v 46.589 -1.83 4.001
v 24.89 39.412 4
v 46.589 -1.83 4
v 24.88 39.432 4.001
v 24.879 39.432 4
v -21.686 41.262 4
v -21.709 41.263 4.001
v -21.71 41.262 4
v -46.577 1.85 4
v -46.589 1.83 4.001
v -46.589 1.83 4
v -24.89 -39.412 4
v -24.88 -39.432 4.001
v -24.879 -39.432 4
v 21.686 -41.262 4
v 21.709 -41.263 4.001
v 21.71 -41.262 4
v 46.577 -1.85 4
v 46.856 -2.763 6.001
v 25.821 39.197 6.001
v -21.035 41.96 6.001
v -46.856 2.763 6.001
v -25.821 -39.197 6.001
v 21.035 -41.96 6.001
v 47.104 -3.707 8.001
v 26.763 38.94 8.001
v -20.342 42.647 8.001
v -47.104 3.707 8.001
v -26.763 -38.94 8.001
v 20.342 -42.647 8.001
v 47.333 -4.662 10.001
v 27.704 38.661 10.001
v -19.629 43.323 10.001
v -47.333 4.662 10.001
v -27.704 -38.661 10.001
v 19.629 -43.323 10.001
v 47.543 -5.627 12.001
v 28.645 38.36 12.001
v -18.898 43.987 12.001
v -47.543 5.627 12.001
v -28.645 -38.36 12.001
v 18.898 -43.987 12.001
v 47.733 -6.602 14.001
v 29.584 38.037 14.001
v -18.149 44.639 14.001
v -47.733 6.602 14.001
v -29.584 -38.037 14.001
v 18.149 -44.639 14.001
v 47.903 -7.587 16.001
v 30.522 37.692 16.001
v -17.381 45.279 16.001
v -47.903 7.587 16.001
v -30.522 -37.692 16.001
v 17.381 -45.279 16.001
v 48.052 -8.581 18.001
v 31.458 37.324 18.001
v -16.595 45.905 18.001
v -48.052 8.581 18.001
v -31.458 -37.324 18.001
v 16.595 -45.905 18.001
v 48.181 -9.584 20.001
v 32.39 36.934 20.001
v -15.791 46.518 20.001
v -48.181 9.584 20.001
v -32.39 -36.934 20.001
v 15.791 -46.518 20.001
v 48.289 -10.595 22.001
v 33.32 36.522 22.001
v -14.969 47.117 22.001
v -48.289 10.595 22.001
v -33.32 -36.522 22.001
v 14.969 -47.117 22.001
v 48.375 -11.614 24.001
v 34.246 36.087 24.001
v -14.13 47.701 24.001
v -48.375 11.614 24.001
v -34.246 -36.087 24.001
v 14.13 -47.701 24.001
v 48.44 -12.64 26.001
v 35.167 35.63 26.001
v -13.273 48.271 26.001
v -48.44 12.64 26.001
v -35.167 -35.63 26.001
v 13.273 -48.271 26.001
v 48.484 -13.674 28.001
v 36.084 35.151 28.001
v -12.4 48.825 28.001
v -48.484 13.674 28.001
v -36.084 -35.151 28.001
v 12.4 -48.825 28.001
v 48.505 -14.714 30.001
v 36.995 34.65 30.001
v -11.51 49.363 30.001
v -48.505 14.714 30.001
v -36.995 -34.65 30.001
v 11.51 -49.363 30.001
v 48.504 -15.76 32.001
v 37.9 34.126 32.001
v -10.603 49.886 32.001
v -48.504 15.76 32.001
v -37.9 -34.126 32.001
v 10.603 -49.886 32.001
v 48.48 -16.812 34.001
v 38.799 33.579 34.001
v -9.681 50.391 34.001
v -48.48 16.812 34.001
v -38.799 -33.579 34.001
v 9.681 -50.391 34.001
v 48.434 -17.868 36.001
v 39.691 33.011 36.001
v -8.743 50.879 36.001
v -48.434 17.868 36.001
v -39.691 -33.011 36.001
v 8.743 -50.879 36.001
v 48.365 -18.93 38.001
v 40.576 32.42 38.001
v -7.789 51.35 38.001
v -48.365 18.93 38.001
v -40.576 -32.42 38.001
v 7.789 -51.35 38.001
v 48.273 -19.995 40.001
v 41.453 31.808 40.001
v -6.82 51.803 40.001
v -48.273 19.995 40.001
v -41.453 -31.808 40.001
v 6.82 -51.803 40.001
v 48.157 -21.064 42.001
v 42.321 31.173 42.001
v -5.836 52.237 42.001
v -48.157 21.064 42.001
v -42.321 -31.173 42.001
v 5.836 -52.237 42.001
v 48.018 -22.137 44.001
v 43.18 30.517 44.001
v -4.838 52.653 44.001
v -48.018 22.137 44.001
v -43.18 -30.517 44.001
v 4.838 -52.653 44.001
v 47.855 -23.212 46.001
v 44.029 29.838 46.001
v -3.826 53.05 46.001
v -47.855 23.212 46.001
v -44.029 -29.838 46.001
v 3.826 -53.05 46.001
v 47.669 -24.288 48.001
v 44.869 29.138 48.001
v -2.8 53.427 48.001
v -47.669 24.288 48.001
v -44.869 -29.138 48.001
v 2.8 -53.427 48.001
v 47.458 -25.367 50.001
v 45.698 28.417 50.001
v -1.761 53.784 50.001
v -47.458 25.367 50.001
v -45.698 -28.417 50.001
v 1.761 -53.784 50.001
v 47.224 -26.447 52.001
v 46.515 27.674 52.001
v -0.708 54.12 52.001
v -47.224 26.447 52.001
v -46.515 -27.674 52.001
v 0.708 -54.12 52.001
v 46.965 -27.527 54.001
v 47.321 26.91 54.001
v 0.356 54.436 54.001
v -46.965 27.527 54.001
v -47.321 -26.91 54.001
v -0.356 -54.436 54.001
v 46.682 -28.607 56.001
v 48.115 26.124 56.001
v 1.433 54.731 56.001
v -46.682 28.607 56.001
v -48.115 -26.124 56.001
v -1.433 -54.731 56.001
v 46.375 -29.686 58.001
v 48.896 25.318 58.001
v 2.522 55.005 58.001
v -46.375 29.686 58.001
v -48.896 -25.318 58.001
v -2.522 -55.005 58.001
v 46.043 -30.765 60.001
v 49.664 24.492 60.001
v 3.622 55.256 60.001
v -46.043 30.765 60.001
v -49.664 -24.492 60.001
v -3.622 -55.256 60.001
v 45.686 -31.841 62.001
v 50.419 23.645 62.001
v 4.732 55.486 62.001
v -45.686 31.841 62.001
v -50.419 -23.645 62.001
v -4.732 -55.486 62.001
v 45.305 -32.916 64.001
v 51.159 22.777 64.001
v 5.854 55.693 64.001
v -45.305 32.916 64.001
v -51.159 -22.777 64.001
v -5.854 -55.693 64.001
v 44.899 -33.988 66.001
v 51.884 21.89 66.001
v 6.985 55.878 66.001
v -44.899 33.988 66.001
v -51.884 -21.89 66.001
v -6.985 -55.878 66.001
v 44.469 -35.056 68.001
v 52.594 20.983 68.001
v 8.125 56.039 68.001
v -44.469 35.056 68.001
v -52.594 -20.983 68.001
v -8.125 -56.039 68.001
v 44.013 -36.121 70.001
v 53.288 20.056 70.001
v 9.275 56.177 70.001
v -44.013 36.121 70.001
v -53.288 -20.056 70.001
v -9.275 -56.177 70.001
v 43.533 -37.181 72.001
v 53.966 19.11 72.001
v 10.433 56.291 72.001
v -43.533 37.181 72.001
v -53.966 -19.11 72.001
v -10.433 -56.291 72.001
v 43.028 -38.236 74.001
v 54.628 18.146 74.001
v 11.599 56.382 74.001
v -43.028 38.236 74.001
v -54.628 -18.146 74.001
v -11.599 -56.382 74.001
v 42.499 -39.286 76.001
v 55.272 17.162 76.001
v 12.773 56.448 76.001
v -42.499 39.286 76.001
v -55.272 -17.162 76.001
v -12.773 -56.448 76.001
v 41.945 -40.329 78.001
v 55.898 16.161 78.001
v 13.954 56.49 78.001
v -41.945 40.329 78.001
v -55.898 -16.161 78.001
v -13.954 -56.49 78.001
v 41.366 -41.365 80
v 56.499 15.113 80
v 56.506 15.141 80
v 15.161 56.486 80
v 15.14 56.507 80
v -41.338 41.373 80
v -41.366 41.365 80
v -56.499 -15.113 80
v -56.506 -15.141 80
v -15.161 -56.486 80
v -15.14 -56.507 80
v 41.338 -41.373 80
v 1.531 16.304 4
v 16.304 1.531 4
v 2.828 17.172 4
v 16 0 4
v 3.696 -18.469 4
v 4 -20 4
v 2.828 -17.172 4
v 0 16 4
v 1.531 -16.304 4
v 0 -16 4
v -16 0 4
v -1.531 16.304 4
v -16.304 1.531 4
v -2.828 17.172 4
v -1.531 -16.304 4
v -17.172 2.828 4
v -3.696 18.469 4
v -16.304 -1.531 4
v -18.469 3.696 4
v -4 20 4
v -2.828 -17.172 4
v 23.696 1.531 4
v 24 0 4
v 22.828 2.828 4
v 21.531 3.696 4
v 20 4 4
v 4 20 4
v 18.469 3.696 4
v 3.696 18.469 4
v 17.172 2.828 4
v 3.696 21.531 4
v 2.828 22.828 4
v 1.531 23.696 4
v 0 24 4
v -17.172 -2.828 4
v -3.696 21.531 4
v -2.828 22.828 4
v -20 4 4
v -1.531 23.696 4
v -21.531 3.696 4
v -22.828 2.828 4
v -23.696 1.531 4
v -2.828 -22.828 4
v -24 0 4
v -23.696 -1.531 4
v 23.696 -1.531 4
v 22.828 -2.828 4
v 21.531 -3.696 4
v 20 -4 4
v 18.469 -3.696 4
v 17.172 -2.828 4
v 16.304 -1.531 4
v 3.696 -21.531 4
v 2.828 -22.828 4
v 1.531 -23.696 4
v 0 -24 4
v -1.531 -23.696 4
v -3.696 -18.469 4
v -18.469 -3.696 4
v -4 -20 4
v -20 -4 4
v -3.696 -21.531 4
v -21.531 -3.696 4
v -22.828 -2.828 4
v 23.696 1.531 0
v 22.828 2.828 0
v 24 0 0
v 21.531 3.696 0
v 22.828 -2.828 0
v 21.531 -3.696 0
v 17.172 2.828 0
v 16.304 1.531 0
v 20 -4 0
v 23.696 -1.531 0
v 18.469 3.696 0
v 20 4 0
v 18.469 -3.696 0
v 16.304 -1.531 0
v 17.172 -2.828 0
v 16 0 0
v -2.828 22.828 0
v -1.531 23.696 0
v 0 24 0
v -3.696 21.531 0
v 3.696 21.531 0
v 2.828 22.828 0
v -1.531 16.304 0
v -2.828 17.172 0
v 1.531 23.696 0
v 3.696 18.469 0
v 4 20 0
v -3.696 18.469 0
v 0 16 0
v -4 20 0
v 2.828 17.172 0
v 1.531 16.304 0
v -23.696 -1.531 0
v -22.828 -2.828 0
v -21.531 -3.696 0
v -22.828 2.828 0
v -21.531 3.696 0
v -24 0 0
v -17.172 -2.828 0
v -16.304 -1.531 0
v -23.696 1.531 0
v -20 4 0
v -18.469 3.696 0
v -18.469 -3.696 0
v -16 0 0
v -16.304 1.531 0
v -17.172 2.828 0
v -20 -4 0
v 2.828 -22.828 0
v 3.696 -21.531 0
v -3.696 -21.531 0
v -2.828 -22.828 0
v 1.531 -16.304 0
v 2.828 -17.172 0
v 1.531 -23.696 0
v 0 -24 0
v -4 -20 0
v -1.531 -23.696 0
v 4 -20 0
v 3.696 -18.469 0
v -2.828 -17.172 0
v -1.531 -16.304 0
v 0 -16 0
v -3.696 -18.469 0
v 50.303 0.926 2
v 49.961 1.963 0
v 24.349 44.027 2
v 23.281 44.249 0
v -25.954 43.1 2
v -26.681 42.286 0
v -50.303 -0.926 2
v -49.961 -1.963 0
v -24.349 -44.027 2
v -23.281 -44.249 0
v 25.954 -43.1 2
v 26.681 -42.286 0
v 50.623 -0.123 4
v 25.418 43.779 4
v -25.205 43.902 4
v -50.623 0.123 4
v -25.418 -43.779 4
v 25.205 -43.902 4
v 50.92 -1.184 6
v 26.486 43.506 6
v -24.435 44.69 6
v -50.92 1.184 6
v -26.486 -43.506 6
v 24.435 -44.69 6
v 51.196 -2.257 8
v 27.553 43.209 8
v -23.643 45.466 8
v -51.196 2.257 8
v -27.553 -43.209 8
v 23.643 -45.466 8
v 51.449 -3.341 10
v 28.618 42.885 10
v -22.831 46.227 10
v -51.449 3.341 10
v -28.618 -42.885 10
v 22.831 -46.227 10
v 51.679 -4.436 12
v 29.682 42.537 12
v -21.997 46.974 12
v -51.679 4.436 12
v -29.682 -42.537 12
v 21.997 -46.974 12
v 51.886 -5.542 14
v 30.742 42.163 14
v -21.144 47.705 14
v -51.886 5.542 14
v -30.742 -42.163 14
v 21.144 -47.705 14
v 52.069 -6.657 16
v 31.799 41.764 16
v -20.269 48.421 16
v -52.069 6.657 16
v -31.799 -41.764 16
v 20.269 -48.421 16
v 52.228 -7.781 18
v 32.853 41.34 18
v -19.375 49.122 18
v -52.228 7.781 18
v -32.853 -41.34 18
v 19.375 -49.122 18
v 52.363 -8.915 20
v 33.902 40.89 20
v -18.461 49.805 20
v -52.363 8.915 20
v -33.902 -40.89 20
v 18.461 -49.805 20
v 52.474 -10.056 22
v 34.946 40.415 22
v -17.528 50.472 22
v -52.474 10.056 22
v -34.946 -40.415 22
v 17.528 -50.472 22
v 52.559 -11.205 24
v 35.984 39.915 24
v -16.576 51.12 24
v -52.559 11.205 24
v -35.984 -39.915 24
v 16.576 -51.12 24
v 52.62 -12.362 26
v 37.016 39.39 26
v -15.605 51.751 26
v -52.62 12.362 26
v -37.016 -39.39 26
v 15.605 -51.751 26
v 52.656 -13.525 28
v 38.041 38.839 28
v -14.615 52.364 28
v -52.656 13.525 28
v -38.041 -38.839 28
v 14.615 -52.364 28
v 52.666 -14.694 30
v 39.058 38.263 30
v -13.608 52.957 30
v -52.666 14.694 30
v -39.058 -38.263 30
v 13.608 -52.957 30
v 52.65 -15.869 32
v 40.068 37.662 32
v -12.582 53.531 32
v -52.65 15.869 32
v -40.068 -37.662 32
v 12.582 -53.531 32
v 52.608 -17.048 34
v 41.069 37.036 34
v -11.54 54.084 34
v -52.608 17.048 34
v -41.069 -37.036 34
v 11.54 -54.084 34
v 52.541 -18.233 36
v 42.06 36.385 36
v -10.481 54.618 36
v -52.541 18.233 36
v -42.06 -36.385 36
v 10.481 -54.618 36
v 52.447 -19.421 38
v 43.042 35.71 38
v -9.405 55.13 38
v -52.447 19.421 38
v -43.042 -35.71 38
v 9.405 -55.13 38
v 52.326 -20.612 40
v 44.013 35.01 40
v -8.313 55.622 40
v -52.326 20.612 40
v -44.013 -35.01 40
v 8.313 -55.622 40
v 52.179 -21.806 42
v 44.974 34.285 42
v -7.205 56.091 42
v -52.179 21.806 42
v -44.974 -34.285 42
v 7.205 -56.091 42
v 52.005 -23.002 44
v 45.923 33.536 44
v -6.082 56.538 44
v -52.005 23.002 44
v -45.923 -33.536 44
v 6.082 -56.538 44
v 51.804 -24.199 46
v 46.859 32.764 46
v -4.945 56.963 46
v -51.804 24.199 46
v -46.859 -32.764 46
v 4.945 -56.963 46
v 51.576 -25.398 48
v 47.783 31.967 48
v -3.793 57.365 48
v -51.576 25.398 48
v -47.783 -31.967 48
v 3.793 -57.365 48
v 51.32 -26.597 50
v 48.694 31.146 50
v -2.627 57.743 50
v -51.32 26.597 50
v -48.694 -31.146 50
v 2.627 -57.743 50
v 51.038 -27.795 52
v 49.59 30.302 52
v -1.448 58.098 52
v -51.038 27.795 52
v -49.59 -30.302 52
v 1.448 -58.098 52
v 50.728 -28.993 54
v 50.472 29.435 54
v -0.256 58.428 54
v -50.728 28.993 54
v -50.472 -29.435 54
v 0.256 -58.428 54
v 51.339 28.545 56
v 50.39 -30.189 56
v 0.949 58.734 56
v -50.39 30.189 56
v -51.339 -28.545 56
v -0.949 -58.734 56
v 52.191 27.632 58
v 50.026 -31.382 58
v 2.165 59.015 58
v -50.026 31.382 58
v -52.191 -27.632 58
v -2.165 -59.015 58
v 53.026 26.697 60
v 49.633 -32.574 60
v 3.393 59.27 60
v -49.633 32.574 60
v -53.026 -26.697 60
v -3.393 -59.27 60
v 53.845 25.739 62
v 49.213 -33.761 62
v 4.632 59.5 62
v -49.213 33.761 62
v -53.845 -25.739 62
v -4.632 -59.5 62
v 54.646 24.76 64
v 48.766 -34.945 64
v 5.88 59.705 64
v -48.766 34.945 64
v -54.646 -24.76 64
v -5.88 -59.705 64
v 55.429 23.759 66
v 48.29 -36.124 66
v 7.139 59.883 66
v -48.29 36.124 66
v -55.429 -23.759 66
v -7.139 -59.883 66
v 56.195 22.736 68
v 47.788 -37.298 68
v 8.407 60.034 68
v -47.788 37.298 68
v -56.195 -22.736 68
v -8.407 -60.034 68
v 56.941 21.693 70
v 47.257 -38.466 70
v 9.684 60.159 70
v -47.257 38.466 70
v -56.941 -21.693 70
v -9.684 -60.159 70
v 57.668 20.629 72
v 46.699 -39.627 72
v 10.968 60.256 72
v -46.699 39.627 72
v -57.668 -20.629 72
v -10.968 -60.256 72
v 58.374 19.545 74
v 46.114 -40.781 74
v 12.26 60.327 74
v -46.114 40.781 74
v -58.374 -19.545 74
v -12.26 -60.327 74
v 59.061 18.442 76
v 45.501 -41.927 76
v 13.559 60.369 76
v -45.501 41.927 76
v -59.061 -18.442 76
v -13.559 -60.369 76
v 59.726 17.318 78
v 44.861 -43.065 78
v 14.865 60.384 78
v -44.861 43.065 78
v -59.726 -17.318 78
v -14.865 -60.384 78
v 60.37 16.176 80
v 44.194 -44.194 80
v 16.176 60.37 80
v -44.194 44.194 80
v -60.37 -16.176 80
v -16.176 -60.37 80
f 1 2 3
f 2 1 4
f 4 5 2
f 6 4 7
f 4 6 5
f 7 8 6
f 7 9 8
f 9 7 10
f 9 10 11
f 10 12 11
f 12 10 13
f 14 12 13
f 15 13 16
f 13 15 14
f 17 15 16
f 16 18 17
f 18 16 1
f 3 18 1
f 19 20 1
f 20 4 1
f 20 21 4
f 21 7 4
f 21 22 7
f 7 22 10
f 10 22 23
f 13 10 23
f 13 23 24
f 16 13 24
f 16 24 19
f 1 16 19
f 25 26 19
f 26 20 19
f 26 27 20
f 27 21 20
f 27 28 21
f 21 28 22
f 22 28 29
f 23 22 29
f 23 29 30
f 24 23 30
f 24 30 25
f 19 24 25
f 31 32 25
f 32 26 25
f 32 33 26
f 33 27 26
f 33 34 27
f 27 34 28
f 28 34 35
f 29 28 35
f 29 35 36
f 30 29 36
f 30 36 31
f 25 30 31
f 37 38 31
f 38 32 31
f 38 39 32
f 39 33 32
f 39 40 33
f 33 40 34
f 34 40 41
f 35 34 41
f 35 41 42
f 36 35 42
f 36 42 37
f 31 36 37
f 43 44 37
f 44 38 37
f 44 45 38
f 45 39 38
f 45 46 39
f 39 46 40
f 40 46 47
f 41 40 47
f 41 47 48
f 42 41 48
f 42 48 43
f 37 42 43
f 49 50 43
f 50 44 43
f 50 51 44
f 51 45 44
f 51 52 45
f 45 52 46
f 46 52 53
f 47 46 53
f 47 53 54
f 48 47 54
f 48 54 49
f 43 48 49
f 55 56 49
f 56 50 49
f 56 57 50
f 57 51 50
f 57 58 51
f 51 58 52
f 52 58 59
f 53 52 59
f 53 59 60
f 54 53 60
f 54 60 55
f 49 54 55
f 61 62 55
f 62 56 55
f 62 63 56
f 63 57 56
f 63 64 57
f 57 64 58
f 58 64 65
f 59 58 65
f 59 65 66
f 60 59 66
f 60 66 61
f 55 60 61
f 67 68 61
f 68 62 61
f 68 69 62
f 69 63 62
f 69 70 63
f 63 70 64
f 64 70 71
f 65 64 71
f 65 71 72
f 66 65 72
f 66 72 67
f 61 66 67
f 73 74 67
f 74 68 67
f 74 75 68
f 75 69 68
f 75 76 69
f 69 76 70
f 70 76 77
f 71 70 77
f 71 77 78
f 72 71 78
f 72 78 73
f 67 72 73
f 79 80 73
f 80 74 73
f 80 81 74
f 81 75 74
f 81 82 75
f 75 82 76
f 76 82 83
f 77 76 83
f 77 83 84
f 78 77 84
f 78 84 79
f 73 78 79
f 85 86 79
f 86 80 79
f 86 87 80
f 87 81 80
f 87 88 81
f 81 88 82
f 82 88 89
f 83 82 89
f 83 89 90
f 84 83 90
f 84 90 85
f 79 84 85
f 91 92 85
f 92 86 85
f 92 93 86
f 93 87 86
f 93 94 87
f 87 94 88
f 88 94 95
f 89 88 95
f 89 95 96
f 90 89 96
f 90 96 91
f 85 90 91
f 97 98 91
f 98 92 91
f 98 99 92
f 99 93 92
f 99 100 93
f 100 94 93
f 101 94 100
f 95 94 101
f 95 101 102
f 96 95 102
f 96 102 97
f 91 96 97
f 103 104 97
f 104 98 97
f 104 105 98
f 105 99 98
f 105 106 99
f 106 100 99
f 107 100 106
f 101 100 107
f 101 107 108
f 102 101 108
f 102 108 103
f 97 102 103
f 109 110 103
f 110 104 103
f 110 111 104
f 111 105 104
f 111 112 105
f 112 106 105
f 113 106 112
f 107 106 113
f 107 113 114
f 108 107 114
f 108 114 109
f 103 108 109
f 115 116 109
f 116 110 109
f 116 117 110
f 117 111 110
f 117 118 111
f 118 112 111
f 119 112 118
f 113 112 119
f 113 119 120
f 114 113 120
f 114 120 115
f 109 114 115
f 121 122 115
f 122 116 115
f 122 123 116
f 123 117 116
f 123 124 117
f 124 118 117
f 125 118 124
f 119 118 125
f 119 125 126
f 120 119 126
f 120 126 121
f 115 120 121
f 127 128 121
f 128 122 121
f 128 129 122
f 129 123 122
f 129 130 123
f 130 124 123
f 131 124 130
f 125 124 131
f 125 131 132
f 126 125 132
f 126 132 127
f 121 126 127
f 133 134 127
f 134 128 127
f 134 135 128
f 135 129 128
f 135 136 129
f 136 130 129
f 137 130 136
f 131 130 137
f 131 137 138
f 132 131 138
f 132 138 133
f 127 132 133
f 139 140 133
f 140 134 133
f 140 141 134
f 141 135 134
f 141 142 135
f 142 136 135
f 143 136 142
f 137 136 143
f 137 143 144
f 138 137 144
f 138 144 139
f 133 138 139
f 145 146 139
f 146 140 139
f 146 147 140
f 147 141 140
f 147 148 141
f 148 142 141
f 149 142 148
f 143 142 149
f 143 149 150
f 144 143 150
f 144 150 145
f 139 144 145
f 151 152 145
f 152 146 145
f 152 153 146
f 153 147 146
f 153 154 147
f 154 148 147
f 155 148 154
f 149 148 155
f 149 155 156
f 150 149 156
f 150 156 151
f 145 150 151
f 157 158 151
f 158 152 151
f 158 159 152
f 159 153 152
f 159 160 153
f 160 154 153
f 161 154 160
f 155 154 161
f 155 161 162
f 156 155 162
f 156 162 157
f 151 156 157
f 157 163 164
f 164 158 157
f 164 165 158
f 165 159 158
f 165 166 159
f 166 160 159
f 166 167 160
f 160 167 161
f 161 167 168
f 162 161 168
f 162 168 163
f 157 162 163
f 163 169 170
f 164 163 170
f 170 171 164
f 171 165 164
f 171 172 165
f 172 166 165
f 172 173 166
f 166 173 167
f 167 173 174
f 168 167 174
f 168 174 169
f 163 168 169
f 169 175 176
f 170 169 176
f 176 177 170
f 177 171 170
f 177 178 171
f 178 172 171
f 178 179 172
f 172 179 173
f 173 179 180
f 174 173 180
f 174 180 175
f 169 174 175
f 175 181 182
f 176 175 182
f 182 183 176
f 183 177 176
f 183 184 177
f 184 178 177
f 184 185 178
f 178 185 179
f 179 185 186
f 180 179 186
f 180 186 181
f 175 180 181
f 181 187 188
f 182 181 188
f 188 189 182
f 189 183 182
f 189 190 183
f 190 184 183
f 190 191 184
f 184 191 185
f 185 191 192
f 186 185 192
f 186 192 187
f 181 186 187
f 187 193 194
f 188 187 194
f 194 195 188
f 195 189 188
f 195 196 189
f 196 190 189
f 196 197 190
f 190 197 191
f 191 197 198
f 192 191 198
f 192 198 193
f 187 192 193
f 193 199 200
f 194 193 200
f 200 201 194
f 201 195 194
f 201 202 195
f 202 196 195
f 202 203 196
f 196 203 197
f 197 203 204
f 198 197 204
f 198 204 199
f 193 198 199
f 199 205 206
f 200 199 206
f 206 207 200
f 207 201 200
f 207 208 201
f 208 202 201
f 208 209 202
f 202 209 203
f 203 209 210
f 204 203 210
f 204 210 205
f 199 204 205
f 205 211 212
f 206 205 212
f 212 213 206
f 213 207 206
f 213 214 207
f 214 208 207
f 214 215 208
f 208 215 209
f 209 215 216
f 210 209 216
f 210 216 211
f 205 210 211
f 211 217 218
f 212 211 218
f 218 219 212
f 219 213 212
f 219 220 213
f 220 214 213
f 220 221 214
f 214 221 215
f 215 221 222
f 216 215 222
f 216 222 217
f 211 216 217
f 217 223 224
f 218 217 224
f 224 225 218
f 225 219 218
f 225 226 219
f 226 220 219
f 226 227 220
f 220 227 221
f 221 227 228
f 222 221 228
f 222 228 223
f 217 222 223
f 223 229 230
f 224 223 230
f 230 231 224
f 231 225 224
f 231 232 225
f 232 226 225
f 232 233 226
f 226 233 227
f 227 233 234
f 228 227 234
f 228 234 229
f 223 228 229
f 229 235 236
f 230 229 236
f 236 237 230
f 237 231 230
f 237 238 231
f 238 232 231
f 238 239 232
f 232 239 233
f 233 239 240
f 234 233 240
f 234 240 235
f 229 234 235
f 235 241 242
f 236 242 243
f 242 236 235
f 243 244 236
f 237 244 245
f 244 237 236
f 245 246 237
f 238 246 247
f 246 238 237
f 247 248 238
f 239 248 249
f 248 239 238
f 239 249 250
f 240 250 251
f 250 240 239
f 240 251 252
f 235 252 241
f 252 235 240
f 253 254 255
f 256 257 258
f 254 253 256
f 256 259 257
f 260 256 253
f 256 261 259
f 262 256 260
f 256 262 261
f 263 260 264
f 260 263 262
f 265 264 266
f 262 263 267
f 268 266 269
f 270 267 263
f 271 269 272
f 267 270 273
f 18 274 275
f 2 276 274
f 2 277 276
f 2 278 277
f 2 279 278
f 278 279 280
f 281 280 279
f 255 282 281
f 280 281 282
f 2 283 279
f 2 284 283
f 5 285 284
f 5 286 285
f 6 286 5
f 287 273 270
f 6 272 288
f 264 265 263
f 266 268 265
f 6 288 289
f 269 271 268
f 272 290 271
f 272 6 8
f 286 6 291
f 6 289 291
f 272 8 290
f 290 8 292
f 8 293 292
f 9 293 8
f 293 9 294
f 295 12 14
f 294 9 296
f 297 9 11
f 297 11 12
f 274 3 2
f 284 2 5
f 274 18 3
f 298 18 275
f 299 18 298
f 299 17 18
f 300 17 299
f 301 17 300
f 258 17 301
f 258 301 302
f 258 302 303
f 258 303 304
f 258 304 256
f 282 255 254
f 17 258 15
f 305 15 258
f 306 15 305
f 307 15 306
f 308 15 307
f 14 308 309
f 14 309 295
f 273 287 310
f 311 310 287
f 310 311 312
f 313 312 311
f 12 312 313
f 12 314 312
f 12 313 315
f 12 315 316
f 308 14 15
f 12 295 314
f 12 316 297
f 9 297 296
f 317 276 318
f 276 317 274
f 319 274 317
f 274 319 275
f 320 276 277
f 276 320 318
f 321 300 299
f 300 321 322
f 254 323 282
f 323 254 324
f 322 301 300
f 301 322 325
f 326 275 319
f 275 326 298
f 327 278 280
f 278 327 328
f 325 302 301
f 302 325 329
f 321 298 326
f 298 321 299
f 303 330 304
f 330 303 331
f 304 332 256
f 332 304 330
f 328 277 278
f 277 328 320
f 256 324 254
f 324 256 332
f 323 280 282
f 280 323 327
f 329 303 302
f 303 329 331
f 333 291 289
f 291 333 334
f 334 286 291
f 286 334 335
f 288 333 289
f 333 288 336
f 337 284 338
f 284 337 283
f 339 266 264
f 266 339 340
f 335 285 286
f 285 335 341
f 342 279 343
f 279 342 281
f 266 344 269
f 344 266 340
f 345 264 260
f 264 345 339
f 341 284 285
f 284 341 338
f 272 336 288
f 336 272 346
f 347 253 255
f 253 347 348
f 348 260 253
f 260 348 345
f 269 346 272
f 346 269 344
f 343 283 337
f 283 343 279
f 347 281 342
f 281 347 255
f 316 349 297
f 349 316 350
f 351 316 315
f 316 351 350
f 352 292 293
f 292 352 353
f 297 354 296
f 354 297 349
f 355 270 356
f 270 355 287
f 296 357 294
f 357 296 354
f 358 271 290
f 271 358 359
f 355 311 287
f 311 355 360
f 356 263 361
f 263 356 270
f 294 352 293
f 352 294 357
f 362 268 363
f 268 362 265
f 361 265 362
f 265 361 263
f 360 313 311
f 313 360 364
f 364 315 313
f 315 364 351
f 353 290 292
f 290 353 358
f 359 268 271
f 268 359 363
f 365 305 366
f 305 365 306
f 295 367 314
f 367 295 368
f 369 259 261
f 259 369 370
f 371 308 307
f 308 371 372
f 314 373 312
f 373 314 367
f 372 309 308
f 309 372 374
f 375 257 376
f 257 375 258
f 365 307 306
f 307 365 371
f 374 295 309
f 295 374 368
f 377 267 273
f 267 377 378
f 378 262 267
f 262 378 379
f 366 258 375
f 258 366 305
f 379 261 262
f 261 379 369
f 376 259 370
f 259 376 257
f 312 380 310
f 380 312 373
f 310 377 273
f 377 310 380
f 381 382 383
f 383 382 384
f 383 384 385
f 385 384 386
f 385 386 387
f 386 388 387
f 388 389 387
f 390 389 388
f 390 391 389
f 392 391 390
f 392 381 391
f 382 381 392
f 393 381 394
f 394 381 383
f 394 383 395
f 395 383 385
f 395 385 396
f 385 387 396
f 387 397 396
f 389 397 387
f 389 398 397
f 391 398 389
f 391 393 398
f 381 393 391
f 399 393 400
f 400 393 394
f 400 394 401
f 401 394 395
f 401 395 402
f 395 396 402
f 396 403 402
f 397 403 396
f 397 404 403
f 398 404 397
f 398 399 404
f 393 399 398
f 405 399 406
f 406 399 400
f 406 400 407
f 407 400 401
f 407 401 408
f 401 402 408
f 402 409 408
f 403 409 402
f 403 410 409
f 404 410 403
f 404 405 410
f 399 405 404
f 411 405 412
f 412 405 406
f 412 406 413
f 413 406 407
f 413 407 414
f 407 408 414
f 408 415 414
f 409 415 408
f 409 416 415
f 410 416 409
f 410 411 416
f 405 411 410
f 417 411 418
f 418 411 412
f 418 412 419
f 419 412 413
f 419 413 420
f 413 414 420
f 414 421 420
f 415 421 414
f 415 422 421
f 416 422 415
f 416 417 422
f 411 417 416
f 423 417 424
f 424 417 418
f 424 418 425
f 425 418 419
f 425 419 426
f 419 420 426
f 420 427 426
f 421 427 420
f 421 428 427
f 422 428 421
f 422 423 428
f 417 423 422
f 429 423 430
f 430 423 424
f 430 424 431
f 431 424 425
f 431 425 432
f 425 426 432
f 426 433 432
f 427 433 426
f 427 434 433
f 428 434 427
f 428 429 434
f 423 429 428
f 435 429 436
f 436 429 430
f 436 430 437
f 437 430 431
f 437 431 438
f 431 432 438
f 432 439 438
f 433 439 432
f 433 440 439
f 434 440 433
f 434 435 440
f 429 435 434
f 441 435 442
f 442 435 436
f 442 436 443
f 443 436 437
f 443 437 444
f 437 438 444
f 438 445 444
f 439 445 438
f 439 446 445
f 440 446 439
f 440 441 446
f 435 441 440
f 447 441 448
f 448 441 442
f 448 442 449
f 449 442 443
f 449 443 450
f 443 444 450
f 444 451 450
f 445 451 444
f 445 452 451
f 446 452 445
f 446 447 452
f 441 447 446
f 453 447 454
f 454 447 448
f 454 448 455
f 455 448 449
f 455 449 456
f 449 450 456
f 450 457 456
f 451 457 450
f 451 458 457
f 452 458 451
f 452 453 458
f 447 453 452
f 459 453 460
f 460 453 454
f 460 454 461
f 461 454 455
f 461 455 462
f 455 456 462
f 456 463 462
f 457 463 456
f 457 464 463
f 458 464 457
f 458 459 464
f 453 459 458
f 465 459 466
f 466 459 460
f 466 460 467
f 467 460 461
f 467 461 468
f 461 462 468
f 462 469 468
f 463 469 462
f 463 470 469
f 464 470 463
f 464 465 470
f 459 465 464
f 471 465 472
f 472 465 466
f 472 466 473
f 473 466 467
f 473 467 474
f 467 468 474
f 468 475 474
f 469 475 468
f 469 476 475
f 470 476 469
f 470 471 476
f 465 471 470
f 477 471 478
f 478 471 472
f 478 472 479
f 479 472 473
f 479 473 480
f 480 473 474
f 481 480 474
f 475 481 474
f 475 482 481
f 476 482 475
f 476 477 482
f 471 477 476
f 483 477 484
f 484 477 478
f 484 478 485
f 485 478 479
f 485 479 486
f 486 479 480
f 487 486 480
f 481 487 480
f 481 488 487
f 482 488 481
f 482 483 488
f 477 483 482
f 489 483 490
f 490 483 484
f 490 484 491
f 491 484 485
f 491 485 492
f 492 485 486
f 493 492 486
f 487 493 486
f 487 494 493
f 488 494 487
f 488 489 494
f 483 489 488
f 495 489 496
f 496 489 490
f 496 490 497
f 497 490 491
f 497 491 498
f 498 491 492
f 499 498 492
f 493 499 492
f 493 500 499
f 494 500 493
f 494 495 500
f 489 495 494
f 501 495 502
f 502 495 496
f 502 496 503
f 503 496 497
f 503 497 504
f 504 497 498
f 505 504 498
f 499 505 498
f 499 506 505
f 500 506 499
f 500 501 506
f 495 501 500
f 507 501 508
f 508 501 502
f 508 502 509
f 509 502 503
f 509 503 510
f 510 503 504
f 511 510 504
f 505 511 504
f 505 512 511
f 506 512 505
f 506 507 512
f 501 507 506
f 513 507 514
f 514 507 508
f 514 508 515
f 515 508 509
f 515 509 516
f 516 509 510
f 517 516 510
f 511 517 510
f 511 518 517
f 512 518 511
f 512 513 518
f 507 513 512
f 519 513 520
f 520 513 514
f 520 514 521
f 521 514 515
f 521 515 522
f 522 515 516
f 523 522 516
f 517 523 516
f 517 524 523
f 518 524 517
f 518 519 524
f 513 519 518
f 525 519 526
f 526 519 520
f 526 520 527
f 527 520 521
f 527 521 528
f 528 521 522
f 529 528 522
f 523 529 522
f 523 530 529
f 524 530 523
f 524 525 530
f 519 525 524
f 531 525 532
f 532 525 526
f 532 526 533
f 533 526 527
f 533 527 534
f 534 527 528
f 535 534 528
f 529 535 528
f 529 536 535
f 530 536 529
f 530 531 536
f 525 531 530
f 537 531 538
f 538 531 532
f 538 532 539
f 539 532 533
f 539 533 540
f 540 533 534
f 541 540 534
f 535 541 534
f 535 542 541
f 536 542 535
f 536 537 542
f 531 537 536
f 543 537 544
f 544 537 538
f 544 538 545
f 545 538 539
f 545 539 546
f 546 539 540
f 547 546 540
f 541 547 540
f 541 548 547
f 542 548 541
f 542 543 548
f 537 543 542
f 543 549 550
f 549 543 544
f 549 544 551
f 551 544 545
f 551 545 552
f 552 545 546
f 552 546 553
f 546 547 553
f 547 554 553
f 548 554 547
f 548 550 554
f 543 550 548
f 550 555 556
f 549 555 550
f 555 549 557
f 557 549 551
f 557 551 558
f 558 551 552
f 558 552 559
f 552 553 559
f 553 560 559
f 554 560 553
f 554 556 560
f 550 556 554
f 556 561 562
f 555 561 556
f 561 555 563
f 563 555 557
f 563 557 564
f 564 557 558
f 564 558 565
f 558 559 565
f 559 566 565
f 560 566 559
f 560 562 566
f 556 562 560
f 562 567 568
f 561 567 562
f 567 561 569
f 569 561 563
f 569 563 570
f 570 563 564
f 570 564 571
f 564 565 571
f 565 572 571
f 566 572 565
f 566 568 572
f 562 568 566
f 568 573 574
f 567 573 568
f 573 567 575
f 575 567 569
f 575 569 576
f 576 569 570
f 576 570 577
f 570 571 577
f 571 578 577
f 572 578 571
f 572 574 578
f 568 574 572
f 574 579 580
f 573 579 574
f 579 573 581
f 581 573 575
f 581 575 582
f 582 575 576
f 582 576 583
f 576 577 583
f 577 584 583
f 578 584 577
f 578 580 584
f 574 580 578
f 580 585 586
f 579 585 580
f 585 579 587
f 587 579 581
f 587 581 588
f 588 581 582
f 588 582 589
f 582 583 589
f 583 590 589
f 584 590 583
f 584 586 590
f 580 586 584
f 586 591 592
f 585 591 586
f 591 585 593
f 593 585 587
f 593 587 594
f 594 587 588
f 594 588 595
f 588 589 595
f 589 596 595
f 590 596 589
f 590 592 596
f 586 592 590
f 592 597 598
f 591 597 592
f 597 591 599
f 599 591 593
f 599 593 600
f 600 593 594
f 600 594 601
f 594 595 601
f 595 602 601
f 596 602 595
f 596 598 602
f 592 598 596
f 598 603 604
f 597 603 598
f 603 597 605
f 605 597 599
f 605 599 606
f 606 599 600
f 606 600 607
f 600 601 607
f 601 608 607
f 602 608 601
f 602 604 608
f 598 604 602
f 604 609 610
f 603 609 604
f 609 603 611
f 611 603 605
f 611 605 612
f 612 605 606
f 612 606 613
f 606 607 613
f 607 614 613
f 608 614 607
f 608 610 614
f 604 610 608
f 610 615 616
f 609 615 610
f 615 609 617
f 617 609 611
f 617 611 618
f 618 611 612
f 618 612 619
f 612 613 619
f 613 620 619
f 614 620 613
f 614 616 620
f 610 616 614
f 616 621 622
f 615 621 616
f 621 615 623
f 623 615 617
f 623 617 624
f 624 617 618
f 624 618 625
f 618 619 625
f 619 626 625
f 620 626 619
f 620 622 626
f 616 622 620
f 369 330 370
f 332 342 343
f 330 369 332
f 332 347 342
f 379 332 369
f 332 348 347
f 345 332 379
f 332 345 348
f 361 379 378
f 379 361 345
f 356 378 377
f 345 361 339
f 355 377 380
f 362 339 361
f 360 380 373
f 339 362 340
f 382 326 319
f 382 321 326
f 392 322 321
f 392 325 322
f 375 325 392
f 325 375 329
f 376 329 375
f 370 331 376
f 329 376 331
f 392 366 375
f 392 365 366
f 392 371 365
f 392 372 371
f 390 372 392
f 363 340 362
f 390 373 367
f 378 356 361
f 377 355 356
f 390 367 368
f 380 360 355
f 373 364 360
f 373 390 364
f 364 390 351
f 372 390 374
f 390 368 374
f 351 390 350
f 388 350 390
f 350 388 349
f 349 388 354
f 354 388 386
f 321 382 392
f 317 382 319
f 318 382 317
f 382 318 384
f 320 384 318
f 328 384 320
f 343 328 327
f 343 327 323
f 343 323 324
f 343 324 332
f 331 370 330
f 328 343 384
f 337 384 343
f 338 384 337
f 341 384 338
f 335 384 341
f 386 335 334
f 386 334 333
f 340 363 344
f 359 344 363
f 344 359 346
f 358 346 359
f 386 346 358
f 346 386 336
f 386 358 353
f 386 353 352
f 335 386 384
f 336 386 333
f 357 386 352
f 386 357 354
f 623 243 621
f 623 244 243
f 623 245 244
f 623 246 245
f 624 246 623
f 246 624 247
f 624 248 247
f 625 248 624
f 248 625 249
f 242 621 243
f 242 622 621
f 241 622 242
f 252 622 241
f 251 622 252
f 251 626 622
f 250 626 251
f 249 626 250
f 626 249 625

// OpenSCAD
use <tubemesh.scad>;

d = 100;
h = 80;
ratio = 1.25;
width = 4;
angle = 45;
sides = 6;
holeSize = 8;
holes = 4;


module dummy() {}

nudge = 0.001;

module solid(delta=0) {
    morphExtrude(ngonPoints(n=sides,d=d-delta*2,rotate=delta>0 ? 0 : angle * width/h),ngonPoints(n=sides,d=ratio*d-delta*2),twist=angle,height=h,numSlices=40);
}

difference() {
    solid();
    difference() {
        translate([0,0,nudge]) solid(delta=width);
        cube([4*d,4*d,2*width],center=true);
    }
    for (i=[0:1:holes-1]) {
        rotate([0,0,360/holes*i]) translate([d*.5*.4,0,0]) cylinder(d=holeSize,h=width*4,center=true,$fn=16);
    }
}
